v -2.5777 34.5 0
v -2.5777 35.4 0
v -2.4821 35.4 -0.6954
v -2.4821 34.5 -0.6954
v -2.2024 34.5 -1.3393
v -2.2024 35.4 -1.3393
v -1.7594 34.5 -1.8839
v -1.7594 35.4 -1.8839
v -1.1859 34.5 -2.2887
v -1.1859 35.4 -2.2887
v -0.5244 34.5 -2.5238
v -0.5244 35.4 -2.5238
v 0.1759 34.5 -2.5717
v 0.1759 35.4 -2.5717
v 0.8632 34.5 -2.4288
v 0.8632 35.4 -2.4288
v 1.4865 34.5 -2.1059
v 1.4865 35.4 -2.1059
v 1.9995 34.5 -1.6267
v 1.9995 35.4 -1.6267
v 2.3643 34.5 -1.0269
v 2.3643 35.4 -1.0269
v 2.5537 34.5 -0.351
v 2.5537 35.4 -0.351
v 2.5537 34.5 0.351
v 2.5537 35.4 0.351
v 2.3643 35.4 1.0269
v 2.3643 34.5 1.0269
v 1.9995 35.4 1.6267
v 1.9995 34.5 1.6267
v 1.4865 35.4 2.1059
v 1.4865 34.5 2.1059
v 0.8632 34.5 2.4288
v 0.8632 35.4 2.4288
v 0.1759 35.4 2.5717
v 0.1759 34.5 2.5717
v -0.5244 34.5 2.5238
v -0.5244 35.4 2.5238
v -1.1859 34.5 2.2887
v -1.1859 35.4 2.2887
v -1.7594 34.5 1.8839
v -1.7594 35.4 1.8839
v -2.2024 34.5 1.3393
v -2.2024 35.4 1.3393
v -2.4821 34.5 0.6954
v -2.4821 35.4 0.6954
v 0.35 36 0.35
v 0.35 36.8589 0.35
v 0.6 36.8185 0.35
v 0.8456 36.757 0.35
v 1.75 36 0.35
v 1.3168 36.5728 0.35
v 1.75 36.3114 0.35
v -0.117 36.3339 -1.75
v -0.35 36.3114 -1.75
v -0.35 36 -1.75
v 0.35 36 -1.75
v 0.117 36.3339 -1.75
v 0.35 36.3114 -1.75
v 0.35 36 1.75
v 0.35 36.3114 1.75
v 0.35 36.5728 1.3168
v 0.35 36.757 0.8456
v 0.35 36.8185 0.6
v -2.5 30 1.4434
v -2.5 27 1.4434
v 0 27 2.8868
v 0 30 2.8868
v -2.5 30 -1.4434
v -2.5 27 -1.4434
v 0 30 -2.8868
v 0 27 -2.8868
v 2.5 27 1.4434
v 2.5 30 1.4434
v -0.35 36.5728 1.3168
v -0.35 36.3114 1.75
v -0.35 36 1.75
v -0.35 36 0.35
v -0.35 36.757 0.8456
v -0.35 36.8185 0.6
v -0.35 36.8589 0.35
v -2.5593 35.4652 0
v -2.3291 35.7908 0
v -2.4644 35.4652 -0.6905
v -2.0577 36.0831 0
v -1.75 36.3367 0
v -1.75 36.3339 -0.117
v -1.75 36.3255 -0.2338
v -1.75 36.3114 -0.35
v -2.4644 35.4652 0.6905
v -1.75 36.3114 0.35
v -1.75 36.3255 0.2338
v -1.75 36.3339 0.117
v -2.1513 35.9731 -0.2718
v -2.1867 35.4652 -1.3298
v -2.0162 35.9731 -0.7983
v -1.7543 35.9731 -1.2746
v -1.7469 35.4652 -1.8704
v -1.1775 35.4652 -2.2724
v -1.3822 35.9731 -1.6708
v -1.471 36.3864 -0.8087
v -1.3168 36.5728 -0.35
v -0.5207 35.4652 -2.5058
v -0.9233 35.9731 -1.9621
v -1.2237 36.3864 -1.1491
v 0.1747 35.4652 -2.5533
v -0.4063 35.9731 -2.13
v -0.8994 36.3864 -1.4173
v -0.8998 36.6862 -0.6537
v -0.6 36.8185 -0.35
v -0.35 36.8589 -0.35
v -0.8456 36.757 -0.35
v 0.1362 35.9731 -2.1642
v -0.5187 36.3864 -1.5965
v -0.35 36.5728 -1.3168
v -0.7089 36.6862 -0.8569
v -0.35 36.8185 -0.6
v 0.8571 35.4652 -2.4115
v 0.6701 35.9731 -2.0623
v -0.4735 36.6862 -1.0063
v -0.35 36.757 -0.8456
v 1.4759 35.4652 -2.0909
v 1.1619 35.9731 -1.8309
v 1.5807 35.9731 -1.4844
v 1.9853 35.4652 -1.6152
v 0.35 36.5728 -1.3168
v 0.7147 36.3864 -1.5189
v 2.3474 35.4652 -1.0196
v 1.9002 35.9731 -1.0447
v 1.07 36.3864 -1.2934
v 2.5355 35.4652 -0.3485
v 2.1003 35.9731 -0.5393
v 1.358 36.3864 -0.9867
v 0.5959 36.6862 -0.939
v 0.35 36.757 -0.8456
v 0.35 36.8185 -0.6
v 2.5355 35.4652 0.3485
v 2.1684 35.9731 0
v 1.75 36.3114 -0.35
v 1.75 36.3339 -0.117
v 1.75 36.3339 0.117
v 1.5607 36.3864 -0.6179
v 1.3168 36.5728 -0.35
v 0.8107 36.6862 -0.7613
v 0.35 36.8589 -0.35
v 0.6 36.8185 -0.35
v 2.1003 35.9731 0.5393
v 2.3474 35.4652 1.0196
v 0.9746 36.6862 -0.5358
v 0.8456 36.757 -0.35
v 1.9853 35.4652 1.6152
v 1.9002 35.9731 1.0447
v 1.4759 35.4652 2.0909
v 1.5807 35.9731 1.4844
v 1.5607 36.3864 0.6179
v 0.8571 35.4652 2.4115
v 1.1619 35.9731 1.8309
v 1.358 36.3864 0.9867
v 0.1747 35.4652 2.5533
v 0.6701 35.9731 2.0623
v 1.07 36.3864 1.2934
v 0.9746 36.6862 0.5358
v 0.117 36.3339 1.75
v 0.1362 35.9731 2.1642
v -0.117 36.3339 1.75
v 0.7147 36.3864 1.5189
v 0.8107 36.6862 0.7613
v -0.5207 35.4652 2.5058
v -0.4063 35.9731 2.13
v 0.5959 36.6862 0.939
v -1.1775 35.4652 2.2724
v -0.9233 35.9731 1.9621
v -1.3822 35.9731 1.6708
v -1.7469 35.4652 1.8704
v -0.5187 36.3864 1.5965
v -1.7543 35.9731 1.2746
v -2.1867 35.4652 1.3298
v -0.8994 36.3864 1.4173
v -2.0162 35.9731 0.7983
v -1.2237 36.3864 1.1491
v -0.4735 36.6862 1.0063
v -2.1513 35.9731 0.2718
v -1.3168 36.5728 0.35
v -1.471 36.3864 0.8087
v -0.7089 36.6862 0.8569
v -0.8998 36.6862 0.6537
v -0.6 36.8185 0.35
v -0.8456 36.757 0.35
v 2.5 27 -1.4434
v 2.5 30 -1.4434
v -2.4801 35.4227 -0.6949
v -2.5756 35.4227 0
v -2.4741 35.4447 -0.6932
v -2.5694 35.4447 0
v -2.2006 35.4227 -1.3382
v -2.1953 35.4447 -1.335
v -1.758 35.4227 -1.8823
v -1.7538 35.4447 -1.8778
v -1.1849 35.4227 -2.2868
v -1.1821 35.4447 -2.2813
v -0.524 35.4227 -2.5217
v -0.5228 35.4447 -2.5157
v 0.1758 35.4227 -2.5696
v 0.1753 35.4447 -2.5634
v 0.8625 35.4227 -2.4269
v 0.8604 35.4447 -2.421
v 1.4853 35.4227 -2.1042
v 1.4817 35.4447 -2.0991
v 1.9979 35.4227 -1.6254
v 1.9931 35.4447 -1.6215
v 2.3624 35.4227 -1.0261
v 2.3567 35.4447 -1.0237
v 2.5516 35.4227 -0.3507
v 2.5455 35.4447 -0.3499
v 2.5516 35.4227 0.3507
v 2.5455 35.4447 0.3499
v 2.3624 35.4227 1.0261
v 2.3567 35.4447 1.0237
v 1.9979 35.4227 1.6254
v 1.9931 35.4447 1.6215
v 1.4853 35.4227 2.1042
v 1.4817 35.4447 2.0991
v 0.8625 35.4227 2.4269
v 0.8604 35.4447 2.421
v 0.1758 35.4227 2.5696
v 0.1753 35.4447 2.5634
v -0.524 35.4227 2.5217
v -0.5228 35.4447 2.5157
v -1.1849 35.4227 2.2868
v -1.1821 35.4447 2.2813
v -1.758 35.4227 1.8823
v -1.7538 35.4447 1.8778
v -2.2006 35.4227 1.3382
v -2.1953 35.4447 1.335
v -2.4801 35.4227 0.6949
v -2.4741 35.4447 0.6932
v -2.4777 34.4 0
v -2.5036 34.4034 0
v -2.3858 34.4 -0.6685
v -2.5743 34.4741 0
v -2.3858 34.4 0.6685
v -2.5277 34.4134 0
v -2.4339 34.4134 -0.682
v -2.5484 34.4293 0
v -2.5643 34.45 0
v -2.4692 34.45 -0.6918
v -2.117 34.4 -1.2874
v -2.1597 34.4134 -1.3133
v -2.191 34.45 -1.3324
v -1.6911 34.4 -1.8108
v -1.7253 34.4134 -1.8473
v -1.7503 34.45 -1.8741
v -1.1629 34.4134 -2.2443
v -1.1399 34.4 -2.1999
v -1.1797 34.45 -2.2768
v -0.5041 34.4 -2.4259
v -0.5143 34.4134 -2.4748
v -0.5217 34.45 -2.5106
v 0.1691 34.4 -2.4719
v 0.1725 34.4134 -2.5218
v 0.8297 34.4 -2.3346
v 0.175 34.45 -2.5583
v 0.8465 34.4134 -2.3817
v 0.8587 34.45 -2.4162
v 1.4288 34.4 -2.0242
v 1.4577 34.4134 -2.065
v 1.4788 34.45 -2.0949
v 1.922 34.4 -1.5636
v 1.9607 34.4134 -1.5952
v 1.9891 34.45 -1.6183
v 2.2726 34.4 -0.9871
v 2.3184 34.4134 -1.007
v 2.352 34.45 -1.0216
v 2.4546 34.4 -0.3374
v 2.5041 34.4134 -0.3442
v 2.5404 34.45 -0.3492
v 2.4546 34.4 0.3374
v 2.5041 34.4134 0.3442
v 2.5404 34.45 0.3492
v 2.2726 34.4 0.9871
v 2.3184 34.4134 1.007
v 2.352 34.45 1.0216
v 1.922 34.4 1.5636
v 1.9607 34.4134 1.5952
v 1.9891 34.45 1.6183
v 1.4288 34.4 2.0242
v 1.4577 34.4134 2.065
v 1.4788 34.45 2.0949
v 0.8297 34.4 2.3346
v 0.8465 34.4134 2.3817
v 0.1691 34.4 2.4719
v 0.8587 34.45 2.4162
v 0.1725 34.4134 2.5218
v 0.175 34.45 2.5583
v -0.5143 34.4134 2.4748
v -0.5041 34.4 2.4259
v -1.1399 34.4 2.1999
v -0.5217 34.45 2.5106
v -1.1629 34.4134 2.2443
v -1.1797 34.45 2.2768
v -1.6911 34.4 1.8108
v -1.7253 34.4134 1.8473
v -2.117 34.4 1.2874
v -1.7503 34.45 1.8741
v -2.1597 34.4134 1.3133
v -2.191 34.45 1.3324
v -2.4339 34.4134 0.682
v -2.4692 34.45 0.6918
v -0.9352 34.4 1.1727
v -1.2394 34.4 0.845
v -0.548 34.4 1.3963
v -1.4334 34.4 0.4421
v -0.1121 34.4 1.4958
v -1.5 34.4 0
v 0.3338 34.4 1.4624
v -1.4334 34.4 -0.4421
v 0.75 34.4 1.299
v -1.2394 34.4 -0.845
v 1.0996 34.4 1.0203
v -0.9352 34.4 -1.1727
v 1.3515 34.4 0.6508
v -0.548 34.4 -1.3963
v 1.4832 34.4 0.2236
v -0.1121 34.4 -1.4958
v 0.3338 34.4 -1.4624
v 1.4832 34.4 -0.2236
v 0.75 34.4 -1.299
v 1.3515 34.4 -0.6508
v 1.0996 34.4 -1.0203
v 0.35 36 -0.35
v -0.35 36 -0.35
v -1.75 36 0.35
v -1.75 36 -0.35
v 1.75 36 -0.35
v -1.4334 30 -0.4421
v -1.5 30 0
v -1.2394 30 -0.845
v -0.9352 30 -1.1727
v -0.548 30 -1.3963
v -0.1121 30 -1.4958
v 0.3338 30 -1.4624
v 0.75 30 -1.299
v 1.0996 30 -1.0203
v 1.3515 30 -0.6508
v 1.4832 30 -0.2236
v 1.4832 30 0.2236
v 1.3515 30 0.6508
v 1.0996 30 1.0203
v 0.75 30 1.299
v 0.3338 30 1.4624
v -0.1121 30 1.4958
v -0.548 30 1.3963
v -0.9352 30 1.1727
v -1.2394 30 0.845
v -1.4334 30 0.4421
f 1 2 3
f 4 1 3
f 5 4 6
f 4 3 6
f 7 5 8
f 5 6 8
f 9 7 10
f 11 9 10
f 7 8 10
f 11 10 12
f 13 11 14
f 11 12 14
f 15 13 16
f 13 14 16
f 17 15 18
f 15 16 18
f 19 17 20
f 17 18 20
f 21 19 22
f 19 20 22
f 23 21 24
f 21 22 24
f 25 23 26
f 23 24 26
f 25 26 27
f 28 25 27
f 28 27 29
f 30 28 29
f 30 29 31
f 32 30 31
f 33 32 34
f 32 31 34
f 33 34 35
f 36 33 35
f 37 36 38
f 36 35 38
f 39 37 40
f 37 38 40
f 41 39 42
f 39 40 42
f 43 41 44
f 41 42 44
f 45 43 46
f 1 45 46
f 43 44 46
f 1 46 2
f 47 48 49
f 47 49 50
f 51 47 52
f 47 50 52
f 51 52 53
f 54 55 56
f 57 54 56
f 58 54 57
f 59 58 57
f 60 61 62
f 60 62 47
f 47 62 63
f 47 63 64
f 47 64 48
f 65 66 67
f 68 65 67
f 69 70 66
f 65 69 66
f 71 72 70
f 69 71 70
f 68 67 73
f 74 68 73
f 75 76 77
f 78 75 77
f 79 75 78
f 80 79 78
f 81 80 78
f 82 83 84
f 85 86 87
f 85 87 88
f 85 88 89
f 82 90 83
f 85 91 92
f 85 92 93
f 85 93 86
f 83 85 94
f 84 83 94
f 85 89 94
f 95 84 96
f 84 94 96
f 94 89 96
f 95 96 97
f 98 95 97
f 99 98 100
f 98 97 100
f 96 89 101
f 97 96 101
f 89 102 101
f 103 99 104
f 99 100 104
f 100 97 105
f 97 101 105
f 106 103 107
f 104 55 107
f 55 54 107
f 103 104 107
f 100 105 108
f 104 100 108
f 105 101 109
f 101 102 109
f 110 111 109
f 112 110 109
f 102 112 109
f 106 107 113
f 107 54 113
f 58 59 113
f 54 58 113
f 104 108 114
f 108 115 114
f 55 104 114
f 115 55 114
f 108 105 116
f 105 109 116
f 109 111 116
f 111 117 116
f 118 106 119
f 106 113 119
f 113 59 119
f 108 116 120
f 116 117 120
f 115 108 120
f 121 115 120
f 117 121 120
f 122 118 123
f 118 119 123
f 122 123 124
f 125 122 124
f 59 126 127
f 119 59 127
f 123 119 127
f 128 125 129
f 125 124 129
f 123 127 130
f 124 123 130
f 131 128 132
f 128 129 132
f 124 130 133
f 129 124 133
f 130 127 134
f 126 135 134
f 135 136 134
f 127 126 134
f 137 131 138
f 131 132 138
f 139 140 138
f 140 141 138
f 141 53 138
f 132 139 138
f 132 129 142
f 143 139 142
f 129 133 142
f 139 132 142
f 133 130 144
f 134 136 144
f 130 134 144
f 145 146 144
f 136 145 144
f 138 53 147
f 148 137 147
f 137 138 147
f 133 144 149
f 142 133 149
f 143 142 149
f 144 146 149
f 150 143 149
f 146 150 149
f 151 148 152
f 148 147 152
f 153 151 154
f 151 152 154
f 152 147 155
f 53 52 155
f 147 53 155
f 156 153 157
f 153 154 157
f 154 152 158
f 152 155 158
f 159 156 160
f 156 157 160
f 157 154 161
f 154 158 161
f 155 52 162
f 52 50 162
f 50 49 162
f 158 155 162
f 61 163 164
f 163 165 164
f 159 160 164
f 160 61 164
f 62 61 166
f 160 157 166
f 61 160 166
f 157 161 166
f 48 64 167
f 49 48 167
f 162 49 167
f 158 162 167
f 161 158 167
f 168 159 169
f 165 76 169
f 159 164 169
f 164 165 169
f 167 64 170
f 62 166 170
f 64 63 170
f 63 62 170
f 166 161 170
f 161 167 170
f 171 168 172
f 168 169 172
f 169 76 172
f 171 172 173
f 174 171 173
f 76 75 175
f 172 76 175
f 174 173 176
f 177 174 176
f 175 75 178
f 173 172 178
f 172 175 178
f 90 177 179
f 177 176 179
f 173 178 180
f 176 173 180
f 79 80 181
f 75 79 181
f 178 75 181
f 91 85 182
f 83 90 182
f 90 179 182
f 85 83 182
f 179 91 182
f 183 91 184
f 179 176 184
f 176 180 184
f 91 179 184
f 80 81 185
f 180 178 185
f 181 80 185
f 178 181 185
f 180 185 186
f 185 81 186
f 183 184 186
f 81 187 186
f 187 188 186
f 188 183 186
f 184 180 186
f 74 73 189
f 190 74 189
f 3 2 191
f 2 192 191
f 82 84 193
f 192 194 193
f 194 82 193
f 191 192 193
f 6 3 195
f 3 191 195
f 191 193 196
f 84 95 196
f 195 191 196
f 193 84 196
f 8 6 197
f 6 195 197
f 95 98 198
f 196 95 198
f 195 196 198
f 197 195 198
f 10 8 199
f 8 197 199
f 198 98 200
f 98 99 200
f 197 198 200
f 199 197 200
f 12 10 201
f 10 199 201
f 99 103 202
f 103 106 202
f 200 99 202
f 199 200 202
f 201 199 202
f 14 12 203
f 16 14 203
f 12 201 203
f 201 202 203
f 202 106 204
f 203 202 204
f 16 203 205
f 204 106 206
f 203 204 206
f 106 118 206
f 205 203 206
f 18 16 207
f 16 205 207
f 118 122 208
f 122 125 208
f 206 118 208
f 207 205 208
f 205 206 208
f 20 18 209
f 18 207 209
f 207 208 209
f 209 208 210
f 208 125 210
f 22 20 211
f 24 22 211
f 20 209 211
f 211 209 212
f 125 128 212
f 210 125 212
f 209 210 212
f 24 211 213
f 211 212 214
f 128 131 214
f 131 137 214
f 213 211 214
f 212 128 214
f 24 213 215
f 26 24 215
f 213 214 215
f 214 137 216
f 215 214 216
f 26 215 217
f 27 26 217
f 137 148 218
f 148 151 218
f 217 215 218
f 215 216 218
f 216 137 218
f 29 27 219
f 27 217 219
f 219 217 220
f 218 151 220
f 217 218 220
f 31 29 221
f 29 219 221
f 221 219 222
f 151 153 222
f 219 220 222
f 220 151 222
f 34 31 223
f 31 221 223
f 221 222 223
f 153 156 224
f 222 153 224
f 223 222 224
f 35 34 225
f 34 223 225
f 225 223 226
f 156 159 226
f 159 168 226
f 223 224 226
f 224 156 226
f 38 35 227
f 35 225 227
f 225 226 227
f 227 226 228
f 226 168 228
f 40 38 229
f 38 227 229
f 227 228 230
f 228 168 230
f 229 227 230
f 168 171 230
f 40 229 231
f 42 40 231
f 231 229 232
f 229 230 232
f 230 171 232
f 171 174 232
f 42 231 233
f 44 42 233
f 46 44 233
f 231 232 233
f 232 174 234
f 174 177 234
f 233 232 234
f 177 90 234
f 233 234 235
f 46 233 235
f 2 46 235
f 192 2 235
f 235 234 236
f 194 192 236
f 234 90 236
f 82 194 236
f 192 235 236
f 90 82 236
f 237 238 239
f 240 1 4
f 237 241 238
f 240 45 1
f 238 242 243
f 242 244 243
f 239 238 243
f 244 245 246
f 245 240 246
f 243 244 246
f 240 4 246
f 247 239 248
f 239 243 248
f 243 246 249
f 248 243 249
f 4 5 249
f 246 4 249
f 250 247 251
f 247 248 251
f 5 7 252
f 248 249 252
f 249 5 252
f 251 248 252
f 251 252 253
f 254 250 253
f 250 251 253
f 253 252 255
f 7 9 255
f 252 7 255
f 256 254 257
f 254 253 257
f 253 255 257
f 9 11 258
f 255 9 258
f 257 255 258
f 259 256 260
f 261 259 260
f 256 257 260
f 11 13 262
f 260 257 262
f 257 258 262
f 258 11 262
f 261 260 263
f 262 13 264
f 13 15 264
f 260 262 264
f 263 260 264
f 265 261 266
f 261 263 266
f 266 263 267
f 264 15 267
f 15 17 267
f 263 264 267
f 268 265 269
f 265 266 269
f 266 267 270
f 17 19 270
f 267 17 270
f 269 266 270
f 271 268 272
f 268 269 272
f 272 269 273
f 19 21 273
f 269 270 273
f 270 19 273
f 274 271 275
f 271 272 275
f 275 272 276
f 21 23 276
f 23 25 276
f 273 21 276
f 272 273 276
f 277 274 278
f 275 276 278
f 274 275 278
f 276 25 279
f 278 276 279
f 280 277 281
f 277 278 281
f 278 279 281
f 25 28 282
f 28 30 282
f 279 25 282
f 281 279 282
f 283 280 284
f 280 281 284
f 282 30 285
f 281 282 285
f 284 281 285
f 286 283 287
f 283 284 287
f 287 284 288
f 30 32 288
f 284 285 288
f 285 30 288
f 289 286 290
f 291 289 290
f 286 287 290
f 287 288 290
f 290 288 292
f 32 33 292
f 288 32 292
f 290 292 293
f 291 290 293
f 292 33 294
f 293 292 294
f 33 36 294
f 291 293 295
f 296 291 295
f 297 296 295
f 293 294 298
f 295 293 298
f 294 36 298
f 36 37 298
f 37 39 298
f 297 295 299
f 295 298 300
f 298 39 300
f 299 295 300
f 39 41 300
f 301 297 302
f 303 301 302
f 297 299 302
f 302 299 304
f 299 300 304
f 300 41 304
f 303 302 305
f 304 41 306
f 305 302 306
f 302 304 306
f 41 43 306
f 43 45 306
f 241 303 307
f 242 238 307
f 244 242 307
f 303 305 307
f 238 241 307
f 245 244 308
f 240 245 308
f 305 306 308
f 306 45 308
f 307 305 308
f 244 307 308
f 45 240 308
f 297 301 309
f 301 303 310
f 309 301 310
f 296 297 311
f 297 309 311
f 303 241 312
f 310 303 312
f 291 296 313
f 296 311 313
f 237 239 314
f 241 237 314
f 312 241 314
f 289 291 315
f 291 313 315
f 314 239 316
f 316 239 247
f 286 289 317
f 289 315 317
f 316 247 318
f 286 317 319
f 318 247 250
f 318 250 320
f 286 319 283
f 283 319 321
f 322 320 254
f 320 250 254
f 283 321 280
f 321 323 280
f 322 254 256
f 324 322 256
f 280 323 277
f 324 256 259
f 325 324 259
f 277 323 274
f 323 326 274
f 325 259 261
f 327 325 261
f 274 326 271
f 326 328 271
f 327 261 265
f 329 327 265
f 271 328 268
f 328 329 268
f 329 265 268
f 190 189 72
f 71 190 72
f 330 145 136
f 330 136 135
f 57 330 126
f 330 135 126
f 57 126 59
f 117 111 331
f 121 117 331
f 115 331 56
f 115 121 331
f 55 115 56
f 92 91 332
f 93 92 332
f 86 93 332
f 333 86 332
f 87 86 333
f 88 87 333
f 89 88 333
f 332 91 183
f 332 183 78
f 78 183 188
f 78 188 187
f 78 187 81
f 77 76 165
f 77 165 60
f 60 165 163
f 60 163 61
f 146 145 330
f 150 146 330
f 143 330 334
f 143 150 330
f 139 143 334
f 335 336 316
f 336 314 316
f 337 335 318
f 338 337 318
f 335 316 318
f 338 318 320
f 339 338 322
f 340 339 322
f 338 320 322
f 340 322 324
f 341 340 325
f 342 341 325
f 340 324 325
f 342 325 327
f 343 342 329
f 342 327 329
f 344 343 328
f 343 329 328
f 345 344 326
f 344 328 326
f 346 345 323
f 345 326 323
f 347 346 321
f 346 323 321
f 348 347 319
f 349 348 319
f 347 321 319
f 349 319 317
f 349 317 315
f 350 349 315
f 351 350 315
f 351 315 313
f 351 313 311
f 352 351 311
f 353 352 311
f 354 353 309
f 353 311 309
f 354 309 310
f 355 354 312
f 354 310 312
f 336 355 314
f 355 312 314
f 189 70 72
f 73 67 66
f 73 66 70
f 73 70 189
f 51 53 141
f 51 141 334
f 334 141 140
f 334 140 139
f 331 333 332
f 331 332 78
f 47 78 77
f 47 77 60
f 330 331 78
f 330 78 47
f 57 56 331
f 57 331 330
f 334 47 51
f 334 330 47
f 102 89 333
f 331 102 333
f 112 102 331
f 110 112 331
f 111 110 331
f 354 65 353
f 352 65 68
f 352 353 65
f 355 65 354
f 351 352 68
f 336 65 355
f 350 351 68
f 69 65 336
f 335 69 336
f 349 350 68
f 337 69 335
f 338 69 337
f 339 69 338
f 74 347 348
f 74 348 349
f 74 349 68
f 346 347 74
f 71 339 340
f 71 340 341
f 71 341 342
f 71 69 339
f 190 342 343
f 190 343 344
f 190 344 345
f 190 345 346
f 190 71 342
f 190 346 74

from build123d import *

# Parameters (mm, degrees)
BOSS_EXTRUDE1_DEPTH = 30
SKETCH1_4_R         = 1.5
BOSS_EXTRUDE2_DEPTH = 6
CUT_EXTRUDE1_DEPTH  = 4
FILLET1_R           = 0.1
SKETCH5_R           = 1.5
BOSS_EXTRUDE3_DEPTH = 3
SKETCH6_R           = 4.535168768
CUT_EXTRUDE2_DEPTH  = 33


with BuildPart() as part:
    # Sketch1 → Boss-Extrude1 (new body)
    with BuildSketch(Plane(origin=(0, 0, 0), x_dir=(1, 0, 0), z_dir=(0, 1, 0))):
        Polygon((2.5, -1.443375673), (2.5, 1.443375673), (0, 2.886751346), (-2.5, 1.443375673), (-2.5, -1.443375673), (0, -2.886751346), align=None)
    extrude(amount=BOSS_EXTRUDE1_DEPTH)

    # Sketch1<4> → Boss-Extrude2 (add)
    with BuildSketch(Plane(origin=(0, 0, 0), x_dir=(1, 0, 0), z_dir=(0, 1, 0))):
        Circle(SKETCH1_4_R)
    extrude(amount=-BOSS_EXTRUDE2_DEPTH)

    # Sketch3 → Revolve1 (revolve)
    with BuildSketch(Plane.XY):
        with BuildLine():
            Line((0, 30), (1.5, 30))
            Line((1.5, 30), (1.5, 34.4))
            Line((1.5, 34.4), (2.577677109, 34.4))
            Line((2.577677109, 34.4), (2.577677109, 35.4))
            ThreePointArc((2.577677109, 35.4), (2.572999105, 35.433876498), (2.559315235, 35.465217406))
            ThreePointArc((2.559315235, 35.465217406), (1.467028933, 36.516835132), (0, 36.9))
            Line((0, 36.9), (0, 30))
        make_face()
    revolve(axis=Axis((0, 30, 0), (0, -1, 0)))

    # Sketch4 → Cut-Extrude1 (cut)
    with BuildSketch(Plane(origin=(0, 40, 0), x_dir=(1, 0, 0), z_dir=(0, 1, 0))):
        Polygon((-1.75, 0.35), (-1.75, -0.35), (-0.35, -0.35), (-0.35, -1.75), (0.35, -1.75), (0.35, -0.35), (1.75, -0.35), (1.75, 0.35), (0.35, 0.35), (0.35, 1.75), (-0.35, 1.75), (-0.35, 0.35), align=None)
    extrude(amount=-CUT_EXTRUDE1_DEPTH, mode=Mode.SUBTRACT)

    # Fillet1
    fillet1_edges = [part.edges().sort_by_distance(p)[0] for p in [
        (-2.577677109, 34.4, 0),
    ]]
    fillet(fillet1_edges, radius=FILLET1_R)


with BuildPart() as body_2:
    # Sketch5 → Boss-Extrude3 (new body)
    with BuildSketch(Plane.XZ.offset(6)):
        Polygon((2.5, 1.443375673), (0, 2.886751346), (-2.5, 1.443375673), (-2.5, -1.443375673), (0, -2.886751346), (2.5, -1.443375673), align=None)
        Circle(SKETCH5_R, mode=Mode.SUBTRACT)
    extrude(amount=-BOSS_EXTRUDE3_DEPTH)


with BuildPart() as cut_extrude2_tool:
    # Sketch6 → Cut-Extrude2 (new body)
    with BuildSketch(Plane.XZ.offset(6)):
        Circle(SKETCH6_R)
    extrude(amount=-CUT_EXTRUDE2_DEPTH)


with BuildPart() as part_1:
    add(part.part)

    # Cut-Extrude2: cut by cut_extrude2_tool
    add(cut_extrude2_tool.part, mode=Mode.SUBTRACT)


with BuildPart() as body_2_1:
    add(body_2.part)

    # Cut-Extrude2: cut by cut_extrude2_tool
    add(cut_extrude2_tool.part, mode=Mode.SUBTRACT)


solid = part_1.part
